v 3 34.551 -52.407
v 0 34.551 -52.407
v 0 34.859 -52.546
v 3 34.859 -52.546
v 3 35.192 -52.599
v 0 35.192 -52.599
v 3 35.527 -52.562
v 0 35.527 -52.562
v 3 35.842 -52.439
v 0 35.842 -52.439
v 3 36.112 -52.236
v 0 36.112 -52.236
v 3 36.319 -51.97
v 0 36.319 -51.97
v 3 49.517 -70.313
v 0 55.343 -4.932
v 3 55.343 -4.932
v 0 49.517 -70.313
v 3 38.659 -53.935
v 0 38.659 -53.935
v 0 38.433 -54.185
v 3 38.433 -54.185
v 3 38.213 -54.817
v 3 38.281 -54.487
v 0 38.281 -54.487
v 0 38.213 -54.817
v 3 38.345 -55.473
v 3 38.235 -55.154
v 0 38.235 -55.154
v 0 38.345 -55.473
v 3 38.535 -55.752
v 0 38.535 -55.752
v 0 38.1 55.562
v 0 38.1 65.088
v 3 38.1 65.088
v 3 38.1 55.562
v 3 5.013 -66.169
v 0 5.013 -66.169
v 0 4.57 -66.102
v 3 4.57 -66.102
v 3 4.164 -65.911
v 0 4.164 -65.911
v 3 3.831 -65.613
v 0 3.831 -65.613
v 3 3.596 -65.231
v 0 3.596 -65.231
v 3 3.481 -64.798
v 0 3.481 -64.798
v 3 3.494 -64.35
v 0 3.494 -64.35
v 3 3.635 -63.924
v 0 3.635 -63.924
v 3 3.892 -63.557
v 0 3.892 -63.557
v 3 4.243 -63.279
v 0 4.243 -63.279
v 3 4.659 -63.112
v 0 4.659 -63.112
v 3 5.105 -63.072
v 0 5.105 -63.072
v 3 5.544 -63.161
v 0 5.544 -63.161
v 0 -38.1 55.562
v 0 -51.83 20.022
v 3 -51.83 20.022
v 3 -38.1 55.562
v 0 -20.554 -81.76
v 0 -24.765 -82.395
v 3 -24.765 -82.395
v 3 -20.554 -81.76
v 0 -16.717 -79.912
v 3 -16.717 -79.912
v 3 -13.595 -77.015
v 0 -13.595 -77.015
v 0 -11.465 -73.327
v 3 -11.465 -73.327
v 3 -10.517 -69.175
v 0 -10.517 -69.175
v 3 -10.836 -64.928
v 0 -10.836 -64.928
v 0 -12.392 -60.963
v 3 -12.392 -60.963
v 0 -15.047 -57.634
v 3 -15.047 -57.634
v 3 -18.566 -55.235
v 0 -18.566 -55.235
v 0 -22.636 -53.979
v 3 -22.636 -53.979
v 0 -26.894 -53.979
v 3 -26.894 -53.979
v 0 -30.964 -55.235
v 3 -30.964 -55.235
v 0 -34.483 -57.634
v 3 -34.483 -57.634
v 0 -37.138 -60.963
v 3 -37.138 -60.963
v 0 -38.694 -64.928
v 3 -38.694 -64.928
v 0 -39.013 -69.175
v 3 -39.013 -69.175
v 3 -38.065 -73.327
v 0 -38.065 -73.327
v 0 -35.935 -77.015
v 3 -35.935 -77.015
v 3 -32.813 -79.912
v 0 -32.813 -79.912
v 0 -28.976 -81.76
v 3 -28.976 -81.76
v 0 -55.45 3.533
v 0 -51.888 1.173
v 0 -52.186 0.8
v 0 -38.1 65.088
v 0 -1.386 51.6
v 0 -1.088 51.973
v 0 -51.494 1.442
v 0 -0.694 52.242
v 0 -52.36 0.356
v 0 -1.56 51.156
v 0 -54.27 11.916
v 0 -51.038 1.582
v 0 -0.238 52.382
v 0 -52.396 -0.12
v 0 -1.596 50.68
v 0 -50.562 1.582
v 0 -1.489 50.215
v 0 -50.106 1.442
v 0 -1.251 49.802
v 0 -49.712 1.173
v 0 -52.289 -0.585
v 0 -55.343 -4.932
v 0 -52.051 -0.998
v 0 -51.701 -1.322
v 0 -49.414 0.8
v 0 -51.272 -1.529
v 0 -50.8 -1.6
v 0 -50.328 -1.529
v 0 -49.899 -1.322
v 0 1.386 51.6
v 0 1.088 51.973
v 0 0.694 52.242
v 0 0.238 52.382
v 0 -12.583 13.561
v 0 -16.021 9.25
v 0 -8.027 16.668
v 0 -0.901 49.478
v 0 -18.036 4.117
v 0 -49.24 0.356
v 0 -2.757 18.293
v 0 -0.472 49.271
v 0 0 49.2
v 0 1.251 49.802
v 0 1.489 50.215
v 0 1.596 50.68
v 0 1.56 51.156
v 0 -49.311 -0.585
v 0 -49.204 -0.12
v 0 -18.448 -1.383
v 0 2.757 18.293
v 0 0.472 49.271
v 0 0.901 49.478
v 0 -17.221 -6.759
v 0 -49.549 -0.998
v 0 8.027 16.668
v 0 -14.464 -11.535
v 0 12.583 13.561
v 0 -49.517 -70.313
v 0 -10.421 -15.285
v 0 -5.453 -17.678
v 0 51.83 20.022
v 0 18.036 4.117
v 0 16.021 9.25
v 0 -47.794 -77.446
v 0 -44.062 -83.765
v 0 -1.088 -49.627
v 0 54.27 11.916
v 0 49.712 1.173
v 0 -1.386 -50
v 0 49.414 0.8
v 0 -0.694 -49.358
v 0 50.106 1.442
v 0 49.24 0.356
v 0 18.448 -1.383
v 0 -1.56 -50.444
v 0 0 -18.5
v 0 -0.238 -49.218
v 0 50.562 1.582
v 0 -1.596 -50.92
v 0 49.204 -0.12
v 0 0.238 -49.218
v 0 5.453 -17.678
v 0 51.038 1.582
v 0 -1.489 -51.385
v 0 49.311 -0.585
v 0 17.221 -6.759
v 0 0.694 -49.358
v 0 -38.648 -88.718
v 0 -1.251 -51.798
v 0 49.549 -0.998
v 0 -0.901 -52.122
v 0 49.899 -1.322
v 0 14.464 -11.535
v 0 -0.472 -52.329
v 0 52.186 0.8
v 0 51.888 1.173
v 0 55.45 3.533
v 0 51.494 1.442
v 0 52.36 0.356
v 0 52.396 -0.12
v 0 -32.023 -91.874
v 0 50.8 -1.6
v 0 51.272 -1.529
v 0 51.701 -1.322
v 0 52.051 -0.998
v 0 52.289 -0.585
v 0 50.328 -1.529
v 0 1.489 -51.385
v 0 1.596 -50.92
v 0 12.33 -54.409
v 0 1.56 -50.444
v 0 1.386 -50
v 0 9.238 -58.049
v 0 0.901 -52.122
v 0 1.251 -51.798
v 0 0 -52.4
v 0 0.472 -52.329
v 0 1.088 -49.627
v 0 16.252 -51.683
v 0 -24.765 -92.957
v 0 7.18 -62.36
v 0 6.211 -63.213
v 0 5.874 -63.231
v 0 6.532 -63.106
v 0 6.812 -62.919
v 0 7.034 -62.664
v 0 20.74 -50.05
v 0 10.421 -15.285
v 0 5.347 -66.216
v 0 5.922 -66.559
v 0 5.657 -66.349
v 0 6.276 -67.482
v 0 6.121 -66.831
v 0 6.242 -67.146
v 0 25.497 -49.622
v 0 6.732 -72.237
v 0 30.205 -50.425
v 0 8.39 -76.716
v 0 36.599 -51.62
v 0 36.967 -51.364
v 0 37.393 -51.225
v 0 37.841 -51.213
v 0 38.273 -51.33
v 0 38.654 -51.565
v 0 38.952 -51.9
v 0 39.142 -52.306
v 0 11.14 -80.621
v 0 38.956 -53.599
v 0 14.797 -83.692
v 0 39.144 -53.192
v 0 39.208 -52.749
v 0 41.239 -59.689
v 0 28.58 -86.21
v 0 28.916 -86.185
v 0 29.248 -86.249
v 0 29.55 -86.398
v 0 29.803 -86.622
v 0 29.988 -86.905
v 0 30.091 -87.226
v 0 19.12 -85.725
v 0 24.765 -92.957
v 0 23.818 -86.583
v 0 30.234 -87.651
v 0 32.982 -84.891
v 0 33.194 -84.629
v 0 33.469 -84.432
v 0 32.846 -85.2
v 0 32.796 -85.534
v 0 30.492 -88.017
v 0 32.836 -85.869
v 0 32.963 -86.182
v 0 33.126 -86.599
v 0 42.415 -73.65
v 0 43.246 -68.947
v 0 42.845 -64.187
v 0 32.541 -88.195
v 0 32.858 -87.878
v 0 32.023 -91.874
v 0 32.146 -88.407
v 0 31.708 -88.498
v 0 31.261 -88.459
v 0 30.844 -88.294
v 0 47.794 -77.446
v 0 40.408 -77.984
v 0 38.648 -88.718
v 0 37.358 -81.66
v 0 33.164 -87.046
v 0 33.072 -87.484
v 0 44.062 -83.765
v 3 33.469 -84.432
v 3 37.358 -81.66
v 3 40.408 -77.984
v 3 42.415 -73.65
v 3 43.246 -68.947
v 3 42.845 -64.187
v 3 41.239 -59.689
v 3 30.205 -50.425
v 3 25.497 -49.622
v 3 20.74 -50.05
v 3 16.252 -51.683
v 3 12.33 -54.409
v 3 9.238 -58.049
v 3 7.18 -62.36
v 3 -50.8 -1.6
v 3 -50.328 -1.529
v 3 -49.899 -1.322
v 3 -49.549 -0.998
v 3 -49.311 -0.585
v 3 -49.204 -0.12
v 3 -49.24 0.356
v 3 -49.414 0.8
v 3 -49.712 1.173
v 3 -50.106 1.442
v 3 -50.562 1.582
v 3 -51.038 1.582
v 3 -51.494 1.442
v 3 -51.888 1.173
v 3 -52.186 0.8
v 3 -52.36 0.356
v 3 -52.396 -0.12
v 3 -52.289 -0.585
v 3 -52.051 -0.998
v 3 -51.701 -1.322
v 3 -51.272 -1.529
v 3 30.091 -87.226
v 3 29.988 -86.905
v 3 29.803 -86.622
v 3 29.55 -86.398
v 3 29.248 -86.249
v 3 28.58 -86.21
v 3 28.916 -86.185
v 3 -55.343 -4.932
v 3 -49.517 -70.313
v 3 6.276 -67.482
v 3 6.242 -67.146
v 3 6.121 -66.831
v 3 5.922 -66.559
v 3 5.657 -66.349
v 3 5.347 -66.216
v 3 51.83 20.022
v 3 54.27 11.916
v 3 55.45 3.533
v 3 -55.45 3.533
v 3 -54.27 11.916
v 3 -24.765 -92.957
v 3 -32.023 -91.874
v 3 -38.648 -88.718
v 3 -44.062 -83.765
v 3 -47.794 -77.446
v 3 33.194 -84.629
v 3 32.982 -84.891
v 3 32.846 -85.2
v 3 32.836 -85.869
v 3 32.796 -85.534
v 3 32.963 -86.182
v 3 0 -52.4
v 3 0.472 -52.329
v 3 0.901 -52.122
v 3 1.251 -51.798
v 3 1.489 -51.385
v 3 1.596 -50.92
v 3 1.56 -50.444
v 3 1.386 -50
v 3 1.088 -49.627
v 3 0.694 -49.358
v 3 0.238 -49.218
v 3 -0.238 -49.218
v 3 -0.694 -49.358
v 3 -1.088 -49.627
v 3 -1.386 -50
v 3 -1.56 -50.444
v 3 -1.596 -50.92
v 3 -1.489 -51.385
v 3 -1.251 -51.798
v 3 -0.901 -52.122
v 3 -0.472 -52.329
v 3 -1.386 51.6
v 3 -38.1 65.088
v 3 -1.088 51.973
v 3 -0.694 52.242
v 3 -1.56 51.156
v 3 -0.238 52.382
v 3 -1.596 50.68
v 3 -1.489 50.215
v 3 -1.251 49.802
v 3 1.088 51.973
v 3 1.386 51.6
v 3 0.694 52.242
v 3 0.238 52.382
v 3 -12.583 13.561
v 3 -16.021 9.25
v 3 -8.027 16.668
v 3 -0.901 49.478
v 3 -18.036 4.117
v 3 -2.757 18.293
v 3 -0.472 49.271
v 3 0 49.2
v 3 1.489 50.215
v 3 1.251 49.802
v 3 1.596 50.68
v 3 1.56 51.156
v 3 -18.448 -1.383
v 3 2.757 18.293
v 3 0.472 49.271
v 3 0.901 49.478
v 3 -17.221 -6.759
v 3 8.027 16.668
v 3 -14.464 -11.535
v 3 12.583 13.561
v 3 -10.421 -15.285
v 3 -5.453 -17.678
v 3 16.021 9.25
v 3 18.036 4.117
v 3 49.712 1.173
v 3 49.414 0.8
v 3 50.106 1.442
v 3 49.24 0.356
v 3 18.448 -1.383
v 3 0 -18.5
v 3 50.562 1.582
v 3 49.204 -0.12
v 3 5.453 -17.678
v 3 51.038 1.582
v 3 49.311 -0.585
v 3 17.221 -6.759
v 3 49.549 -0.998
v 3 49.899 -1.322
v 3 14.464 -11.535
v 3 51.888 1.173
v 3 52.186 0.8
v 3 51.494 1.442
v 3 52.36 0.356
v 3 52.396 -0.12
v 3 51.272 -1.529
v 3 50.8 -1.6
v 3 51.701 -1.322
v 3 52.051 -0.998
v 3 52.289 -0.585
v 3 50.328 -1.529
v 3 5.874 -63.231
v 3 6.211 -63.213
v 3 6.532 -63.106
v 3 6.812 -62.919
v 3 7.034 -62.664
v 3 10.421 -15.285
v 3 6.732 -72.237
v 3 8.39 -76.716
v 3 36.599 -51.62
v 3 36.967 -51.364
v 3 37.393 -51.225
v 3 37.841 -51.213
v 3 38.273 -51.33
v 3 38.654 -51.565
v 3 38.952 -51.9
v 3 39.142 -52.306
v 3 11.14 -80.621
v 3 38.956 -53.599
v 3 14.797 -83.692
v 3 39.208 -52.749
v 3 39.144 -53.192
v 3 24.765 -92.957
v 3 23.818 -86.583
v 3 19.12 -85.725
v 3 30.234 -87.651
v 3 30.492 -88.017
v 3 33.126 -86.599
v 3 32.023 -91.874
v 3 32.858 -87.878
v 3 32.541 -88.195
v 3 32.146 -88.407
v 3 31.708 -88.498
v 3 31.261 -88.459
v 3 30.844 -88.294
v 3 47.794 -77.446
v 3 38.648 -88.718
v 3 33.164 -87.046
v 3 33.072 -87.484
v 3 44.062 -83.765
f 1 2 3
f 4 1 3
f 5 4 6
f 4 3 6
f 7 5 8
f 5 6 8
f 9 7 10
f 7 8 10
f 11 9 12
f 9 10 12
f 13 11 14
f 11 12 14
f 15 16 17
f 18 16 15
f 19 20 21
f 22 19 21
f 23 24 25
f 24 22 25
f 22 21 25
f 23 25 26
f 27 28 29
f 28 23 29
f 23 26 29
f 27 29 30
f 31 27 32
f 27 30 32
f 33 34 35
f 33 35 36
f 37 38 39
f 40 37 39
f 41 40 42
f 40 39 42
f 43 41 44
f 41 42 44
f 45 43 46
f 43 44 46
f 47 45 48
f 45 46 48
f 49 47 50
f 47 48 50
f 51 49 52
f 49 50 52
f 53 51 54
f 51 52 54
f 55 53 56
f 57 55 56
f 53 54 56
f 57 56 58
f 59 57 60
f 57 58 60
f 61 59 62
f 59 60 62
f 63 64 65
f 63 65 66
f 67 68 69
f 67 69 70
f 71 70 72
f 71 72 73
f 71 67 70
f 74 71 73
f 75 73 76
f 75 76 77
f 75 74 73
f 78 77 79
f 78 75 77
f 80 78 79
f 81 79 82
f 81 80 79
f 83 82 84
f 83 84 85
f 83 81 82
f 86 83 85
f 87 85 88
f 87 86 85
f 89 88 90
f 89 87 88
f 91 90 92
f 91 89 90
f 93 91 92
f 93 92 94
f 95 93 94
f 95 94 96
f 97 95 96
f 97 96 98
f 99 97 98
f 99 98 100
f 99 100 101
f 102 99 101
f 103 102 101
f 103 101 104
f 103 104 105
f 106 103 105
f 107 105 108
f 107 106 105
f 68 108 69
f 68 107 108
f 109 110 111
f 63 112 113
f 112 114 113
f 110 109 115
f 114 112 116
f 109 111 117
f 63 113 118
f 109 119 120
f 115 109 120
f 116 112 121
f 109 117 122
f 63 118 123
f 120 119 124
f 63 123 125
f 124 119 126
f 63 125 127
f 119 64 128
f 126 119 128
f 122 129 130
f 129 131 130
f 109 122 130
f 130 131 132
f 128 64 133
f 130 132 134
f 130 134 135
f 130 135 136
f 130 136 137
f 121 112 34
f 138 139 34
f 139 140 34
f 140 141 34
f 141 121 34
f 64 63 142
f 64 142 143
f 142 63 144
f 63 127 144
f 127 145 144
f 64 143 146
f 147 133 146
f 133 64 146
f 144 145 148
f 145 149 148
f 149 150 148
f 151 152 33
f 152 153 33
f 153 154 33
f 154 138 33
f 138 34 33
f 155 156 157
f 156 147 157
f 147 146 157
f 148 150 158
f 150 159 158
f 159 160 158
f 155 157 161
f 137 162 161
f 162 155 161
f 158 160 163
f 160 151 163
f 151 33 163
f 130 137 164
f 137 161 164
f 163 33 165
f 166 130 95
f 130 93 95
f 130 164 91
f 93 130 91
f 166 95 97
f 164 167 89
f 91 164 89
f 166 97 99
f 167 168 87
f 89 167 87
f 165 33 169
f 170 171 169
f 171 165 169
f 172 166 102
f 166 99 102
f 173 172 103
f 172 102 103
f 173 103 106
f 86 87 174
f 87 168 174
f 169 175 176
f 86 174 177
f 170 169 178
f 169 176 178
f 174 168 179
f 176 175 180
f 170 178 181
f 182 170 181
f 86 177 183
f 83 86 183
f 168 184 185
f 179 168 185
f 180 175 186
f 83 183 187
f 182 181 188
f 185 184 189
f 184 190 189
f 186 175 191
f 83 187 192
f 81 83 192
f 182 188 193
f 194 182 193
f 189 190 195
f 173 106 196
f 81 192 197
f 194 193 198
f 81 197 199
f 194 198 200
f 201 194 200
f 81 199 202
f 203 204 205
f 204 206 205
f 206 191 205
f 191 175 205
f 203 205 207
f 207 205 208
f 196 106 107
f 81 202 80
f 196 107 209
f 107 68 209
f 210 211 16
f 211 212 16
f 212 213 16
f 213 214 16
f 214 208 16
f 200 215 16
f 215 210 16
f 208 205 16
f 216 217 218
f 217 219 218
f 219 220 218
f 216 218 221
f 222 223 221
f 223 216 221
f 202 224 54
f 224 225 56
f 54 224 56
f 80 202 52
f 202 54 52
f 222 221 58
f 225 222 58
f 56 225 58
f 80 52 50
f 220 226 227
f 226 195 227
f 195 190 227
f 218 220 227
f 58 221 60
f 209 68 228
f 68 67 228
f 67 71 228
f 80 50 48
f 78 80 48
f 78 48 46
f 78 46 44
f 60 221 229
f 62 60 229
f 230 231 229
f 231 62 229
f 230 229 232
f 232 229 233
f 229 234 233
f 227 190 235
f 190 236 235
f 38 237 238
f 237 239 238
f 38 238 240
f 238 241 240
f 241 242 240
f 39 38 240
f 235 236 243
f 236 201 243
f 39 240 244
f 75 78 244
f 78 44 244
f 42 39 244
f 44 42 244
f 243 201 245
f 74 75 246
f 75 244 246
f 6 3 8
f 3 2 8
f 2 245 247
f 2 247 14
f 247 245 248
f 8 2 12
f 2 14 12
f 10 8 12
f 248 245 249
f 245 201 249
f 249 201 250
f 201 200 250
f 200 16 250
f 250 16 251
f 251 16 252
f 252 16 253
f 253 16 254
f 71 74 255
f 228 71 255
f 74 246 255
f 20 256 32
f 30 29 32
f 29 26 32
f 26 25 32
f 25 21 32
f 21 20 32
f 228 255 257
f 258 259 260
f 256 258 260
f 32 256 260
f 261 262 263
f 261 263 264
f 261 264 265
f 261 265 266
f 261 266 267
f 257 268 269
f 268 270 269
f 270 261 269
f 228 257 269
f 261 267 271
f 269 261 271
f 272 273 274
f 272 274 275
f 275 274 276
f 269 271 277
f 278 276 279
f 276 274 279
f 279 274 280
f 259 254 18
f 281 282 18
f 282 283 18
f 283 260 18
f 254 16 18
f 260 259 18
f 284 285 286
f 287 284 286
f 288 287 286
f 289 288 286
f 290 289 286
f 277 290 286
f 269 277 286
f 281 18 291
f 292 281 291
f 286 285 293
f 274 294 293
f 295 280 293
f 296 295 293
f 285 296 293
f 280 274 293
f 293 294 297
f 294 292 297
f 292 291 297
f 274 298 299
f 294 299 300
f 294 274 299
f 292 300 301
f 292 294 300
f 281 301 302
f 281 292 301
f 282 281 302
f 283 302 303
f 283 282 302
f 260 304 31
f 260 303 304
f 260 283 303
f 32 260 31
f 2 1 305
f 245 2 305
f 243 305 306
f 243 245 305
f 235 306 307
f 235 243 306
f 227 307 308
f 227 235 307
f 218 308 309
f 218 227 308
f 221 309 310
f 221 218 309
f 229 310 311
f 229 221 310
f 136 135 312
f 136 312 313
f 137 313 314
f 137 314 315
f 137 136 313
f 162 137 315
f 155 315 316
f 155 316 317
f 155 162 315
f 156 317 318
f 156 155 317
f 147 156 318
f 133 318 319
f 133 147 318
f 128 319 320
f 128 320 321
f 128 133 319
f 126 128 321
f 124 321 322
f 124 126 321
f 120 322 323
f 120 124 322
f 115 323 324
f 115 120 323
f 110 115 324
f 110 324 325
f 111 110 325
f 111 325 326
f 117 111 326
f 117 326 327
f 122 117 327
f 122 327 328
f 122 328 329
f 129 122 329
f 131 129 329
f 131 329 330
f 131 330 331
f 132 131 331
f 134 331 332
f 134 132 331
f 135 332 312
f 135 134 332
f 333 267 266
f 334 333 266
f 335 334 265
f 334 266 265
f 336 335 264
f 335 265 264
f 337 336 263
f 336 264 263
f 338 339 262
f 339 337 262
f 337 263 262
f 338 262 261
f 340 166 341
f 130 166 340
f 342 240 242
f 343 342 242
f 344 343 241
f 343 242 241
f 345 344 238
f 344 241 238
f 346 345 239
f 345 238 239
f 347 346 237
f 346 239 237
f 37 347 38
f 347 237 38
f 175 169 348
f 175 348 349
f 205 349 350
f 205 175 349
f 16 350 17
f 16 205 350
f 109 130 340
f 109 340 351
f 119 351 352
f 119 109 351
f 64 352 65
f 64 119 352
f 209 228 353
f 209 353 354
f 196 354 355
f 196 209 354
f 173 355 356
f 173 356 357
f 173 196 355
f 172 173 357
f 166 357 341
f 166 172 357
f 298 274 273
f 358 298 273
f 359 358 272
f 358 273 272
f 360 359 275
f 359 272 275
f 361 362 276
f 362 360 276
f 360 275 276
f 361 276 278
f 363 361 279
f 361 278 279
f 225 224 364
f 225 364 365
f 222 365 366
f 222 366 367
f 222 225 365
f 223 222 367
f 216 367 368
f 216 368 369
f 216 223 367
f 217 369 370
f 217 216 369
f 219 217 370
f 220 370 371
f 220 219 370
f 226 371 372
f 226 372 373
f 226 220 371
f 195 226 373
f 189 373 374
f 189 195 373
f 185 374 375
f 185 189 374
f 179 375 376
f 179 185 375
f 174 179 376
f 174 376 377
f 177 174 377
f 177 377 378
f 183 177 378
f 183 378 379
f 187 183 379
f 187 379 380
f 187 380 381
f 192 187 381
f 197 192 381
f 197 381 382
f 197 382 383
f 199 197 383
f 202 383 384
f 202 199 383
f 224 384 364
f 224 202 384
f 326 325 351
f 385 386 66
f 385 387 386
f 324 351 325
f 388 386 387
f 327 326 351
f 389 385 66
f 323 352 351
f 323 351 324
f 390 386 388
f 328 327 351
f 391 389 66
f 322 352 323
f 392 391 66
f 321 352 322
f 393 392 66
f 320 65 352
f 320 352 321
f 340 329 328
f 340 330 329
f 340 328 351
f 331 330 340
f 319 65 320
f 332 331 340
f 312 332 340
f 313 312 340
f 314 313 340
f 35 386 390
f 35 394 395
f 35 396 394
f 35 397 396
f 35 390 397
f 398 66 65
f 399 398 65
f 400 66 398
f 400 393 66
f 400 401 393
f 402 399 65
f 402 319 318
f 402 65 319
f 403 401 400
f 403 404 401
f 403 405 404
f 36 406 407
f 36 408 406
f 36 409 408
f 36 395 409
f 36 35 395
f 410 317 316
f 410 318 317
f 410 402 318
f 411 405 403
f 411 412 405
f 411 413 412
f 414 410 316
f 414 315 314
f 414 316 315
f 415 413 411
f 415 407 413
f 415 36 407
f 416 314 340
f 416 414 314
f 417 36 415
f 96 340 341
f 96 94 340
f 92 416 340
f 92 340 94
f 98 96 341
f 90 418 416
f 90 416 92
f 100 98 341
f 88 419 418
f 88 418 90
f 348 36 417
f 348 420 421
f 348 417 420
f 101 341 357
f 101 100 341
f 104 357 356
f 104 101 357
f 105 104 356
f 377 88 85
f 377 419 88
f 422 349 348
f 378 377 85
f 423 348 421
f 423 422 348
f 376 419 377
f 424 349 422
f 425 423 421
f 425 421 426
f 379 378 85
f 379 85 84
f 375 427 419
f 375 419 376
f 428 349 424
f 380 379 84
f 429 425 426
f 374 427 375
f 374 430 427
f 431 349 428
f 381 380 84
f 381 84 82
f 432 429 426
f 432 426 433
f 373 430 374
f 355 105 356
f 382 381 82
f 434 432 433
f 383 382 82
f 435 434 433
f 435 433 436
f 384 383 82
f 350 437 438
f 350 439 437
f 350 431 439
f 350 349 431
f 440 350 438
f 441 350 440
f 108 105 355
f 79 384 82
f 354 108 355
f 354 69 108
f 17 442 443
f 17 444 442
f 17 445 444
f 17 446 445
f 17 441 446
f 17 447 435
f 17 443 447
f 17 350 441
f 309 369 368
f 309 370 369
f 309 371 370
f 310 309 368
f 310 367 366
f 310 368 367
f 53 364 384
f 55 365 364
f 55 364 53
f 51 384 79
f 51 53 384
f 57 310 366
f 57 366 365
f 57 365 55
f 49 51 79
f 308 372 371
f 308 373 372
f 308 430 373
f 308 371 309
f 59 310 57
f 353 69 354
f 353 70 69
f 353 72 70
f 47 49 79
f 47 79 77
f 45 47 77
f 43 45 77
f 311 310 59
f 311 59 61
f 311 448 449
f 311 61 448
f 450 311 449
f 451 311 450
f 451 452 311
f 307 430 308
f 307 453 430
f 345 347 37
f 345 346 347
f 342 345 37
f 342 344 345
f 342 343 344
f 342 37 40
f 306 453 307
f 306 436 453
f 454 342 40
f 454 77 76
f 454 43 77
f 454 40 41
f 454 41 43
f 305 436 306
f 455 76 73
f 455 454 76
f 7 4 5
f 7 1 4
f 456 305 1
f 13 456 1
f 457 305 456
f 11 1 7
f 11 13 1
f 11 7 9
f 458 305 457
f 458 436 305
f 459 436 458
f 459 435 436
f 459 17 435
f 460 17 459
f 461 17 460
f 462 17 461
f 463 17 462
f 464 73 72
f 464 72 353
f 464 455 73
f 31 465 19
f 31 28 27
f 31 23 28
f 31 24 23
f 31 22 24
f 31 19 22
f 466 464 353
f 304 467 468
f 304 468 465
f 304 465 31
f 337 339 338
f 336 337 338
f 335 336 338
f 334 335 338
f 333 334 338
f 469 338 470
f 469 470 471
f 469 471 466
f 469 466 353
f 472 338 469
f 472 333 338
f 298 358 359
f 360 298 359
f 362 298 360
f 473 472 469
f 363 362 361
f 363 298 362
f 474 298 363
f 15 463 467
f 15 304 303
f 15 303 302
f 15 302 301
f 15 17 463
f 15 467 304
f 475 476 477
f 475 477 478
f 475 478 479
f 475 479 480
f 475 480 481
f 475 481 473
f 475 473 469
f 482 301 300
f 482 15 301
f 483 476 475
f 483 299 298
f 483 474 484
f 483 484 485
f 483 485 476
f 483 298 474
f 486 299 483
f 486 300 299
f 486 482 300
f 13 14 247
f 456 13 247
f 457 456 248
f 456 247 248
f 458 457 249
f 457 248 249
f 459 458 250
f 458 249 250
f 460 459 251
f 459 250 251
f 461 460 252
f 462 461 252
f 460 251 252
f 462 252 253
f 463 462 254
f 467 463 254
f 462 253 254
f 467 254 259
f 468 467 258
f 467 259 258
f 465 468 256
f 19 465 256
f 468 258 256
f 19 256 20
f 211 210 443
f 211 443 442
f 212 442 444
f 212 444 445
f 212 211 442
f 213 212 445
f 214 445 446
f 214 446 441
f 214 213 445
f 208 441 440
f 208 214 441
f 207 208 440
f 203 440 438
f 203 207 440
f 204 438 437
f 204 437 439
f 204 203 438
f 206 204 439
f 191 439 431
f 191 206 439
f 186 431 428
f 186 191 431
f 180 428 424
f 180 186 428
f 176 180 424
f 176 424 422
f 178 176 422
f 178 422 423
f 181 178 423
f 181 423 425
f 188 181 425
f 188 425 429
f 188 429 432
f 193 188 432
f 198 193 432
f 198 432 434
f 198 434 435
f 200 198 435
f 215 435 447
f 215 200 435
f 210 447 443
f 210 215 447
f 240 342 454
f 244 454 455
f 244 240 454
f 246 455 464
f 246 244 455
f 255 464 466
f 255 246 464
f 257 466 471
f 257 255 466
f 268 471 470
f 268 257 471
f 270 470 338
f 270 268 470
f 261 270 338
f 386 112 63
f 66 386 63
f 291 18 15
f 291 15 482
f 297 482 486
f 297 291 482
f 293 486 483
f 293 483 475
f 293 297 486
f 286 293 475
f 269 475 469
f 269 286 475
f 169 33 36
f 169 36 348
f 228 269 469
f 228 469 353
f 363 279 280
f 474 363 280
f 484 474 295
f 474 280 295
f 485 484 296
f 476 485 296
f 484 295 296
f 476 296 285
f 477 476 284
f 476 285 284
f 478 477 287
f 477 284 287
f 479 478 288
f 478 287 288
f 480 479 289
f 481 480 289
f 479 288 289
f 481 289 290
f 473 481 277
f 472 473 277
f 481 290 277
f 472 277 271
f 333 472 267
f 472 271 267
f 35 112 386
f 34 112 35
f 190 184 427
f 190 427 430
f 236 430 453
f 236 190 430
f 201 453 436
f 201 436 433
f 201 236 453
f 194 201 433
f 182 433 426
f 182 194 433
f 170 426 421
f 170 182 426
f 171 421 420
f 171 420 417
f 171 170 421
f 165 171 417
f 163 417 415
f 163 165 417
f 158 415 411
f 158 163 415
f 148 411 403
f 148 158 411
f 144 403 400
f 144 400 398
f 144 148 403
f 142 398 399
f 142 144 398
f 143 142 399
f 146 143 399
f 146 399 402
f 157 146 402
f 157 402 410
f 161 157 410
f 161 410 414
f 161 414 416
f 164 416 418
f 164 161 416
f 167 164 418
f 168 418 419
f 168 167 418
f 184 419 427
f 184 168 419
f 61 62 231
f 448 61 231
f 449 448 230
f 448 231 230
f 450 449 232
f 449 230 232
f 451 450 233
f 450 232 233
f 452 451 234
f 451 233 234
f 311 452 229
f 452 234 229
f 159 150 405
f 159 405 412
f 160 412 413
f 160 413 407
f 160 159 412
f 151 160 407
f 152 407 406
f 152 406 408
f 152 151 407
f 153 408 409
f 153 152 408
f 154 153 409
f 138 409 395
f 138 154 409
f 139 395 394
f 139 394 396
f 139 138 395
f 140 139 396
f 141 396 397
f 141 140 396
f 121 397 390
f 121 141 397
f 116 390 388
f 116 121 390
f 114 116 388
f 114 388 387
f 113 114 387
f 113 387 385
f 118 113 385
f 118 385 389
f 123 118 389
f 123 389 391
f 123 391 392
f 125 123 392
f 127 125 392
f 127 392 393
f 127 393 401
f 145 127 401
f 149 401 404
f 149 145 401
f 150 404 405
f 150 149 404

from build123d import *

# Parameters (mm, degrees)
SKETCH1_R           = 1.6
SKETCH1_R_2         = 18.5
SKETCH1_R_3         = 14.2875
SKETCH1_W           = 9.525
SKETCH1_H           = 76.2
BOSS_EXTRUDE1_DEPTH = 3
CUT_EXTRUDE1_DEPTH  = 109.338539954
CIRPATTERN1_COUNT   = 3


with BuildPart() as part:
    # Sketch1 → Boss-Extrude1 (new body)
    # profile 1 of 2: a face of its own
    with BuildSketch(Plane(origin=(0, 0, 0), x_dir=(0, 0, -1), z_dir=(1, 0, 0))):
        with BuildLine():
            ThreePointArc((4.931768052, -55.34319353), (-7.747067981, -55.019763212), (-20.022244586, -51.829539145))
            Line((-20.022244586, -51.829539145), (-55.5625, -38.1))
            Line((-55.5625, -38.1), (-55.5625, 38.1))
            Line((-55.5625, 38.1), (-20.022244586, 51.829539145))
            ThreePointArc((-20.022244586, 51.829539145), (-7.747067981, 55.019763212), (4.931768052, 55.34319353))
            Line((4.931768052, 55.34319353), (70.31294072, 49.516916477))
            ThreePointArc((70.31294072, 49.516916477), (86.442097474, 41.538651245), (92.957236583, 24.765))
            Line((92.957236583, 24.765), (92.957236583, -24.765))
            ThreePointArc((92.957236583, -24.765), (86.442097474, -41.538651245), (70.31294072, -49.516916477))
            Line((70.31294072, -49.516916477), (4.931768052, -55.34319353))
        make_face()
        with Locations((-50.8, 0)):
            Circle(SKETCH1_R, mode=Mode.SUBTRACT)
        with Locations((0, -50.8)):
            Circle(SKETCH1_R, mode=Mode.SUBTRACT)
        with Locations((50.8, 0)):
            Circle(SKETCH1_R, mode=Mode.SUBTRACT)
        with Locations((0, 50.8)):
            Circle(SKETCH1_R, mode=Mode.SUBTRACT)
        Circle(SKETCH1_R_2, mode=Mode.SUBTRACT)
        with Locations((68.107236583, -24.765)):
            Circle(SKETCH1_R_3, mode=Mode.SUBTRACT)
        with Locations((68.107236583, 24.765)):
            Circle(SKETCH1_R_2, mode=Mode.SUBTRACT)
    # profile 2 of 2: a face of its own
    with BuildSketch(Plane(origin=(0, 0, 0), x_dir=(0, 0, -1), z_dir=(1, 0, 0))):
        with Locations((-60.325, 0)):
            Rectangle(SKETCH1_W, SKETCH1_H)
    extrude(amount=BOSS_EXTRUDE1_DEPTH)

    # Sketch2 → Cut-Extrude1 (cut, symmetric)
    with BuildSketch(Plane.ZY):
        with BuildLine():
            ThreePointArc((-86.182075073, 32.962919695), (-88.406895893, 32.146316407), (-87.226207177, 30.09140941))
            ThreePointArc((-87.226207177, 30.09140941), (-86.398498104, 29.550435617), (-86.209643196, 28.579823038))
            ThreePointArc((-86.209643196, 28.579823038), (-85.493518863, 31.086960811), (-84.432027328, 33.46851694))
            ThreePointArc((-84.432027328, 33.46851694), (-85.200208842, 32.845899791), (-86.182075073, 32.962919695))
        make_face()
    cut_extrude1 = extrude(amount=CUT_EXTRUDE1_DEPTH, both=True, mode=Mode.SUBTRACT)

    # CirPattern1: Cut-Extrude1 ×3 about axis
    cirpattern1_axis = Axis((0, 24.765, -68.107236583), (1, 0, 0))
    for i in range(1, CIRPATTERN1_COUNT):
        add(cut_extrude1.rotate(cirpattern1_axis, i * 360 / CIRPATTERN1_COUNT), mode=Mode.SUBTRACT)


solid = part.part
